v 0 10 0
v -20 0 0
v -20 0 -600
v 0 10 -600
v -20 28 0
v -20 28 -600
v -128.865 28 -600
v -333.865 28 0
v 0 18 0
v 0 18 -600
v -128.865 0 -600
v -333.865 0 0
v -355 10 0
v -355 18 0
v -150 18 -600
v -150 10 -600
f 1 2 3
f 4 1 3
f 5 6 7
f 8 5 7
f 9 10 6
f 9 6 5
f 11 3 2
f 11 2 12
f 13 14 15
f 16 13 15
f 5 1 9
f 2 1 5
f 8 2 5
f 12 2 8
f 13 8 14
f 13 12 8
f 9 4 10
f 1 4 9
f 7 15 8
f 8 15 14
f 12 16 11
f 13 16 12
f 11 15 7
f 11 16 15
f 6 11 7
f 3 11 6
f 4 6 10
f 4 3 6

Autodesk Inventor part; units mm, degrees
ref_plane "YZ Plane" through (0, 0, 0) normal (1, 0, 0) x (0, 1, 0)
ref_plane "XZ Plane" through (0, 0, 0) normal (0, 1, 0) x (-1, 0, 0)
sketch "Sketch1" plane through (0, 0, 0) normal (0, 1, 0) x (-1, 0, 0)
  line L0 (0, 0) -> (355, 0)
  line L1 (355, 0) -> (355, -600)
  line L2 (355, -600) -> (0, -600)
  line L3 (0, -600) -> (0, 0)
  dimension "d0" = 600
  dimension "d1" = 355
extrude "Extrusion1" add sketch "Sketch1" along normal blind 28
sketch "Sketch2" plane through (0, 28, 0) normal (0, 1, 0) x (1, 0, 0)
  line L0 (-355, 600) -> (-355, 0) projected
  line L1 (0, 600) -> (-355, 600) projected
  line L2 (0, 600) -> (-355, 600) projected
  line L3 (-355, 600) -> (-355, 0) projected
  line L4 (-355, 0) -> (0, 0) projected
  line L5 (0, 0) -> (0, 600) projected
  line L6 (-355, 0) -> (-150, 600)
  point P0 (-150, 600)
  dimension "d7" = 150
  dimension "d8" = 0
extrude "Extrusion2" cut sketch "Sketch2" against normal blind 200 contours L1 L6 L0
ref_plane "Work Plane1" through (0, 14, 0) normal (0, 1, 0) x (1, 0, 0)
chamfer "Chamfer1" distance 20 distance2 10 1 edges at (0, 28, -300) measured on face at (-168.3333, 28, -200)
chamfer "Chamfer2" distance 10 distance2 20 1 edges at (0, 0, -300) measured on face at (0, 6, -200)
chamfer "Chamfer3" distance 20 distance2 10 1 edges at (-252.5, 28, -300) measured on face at (-175, 28, -200)
chamfer "Chamfer4" distance 20 distance2 10 1 edges at (-252.5, 0, -300) measured on face at (-175, 0, -200)
properties part number "Foam_wing_V2"
